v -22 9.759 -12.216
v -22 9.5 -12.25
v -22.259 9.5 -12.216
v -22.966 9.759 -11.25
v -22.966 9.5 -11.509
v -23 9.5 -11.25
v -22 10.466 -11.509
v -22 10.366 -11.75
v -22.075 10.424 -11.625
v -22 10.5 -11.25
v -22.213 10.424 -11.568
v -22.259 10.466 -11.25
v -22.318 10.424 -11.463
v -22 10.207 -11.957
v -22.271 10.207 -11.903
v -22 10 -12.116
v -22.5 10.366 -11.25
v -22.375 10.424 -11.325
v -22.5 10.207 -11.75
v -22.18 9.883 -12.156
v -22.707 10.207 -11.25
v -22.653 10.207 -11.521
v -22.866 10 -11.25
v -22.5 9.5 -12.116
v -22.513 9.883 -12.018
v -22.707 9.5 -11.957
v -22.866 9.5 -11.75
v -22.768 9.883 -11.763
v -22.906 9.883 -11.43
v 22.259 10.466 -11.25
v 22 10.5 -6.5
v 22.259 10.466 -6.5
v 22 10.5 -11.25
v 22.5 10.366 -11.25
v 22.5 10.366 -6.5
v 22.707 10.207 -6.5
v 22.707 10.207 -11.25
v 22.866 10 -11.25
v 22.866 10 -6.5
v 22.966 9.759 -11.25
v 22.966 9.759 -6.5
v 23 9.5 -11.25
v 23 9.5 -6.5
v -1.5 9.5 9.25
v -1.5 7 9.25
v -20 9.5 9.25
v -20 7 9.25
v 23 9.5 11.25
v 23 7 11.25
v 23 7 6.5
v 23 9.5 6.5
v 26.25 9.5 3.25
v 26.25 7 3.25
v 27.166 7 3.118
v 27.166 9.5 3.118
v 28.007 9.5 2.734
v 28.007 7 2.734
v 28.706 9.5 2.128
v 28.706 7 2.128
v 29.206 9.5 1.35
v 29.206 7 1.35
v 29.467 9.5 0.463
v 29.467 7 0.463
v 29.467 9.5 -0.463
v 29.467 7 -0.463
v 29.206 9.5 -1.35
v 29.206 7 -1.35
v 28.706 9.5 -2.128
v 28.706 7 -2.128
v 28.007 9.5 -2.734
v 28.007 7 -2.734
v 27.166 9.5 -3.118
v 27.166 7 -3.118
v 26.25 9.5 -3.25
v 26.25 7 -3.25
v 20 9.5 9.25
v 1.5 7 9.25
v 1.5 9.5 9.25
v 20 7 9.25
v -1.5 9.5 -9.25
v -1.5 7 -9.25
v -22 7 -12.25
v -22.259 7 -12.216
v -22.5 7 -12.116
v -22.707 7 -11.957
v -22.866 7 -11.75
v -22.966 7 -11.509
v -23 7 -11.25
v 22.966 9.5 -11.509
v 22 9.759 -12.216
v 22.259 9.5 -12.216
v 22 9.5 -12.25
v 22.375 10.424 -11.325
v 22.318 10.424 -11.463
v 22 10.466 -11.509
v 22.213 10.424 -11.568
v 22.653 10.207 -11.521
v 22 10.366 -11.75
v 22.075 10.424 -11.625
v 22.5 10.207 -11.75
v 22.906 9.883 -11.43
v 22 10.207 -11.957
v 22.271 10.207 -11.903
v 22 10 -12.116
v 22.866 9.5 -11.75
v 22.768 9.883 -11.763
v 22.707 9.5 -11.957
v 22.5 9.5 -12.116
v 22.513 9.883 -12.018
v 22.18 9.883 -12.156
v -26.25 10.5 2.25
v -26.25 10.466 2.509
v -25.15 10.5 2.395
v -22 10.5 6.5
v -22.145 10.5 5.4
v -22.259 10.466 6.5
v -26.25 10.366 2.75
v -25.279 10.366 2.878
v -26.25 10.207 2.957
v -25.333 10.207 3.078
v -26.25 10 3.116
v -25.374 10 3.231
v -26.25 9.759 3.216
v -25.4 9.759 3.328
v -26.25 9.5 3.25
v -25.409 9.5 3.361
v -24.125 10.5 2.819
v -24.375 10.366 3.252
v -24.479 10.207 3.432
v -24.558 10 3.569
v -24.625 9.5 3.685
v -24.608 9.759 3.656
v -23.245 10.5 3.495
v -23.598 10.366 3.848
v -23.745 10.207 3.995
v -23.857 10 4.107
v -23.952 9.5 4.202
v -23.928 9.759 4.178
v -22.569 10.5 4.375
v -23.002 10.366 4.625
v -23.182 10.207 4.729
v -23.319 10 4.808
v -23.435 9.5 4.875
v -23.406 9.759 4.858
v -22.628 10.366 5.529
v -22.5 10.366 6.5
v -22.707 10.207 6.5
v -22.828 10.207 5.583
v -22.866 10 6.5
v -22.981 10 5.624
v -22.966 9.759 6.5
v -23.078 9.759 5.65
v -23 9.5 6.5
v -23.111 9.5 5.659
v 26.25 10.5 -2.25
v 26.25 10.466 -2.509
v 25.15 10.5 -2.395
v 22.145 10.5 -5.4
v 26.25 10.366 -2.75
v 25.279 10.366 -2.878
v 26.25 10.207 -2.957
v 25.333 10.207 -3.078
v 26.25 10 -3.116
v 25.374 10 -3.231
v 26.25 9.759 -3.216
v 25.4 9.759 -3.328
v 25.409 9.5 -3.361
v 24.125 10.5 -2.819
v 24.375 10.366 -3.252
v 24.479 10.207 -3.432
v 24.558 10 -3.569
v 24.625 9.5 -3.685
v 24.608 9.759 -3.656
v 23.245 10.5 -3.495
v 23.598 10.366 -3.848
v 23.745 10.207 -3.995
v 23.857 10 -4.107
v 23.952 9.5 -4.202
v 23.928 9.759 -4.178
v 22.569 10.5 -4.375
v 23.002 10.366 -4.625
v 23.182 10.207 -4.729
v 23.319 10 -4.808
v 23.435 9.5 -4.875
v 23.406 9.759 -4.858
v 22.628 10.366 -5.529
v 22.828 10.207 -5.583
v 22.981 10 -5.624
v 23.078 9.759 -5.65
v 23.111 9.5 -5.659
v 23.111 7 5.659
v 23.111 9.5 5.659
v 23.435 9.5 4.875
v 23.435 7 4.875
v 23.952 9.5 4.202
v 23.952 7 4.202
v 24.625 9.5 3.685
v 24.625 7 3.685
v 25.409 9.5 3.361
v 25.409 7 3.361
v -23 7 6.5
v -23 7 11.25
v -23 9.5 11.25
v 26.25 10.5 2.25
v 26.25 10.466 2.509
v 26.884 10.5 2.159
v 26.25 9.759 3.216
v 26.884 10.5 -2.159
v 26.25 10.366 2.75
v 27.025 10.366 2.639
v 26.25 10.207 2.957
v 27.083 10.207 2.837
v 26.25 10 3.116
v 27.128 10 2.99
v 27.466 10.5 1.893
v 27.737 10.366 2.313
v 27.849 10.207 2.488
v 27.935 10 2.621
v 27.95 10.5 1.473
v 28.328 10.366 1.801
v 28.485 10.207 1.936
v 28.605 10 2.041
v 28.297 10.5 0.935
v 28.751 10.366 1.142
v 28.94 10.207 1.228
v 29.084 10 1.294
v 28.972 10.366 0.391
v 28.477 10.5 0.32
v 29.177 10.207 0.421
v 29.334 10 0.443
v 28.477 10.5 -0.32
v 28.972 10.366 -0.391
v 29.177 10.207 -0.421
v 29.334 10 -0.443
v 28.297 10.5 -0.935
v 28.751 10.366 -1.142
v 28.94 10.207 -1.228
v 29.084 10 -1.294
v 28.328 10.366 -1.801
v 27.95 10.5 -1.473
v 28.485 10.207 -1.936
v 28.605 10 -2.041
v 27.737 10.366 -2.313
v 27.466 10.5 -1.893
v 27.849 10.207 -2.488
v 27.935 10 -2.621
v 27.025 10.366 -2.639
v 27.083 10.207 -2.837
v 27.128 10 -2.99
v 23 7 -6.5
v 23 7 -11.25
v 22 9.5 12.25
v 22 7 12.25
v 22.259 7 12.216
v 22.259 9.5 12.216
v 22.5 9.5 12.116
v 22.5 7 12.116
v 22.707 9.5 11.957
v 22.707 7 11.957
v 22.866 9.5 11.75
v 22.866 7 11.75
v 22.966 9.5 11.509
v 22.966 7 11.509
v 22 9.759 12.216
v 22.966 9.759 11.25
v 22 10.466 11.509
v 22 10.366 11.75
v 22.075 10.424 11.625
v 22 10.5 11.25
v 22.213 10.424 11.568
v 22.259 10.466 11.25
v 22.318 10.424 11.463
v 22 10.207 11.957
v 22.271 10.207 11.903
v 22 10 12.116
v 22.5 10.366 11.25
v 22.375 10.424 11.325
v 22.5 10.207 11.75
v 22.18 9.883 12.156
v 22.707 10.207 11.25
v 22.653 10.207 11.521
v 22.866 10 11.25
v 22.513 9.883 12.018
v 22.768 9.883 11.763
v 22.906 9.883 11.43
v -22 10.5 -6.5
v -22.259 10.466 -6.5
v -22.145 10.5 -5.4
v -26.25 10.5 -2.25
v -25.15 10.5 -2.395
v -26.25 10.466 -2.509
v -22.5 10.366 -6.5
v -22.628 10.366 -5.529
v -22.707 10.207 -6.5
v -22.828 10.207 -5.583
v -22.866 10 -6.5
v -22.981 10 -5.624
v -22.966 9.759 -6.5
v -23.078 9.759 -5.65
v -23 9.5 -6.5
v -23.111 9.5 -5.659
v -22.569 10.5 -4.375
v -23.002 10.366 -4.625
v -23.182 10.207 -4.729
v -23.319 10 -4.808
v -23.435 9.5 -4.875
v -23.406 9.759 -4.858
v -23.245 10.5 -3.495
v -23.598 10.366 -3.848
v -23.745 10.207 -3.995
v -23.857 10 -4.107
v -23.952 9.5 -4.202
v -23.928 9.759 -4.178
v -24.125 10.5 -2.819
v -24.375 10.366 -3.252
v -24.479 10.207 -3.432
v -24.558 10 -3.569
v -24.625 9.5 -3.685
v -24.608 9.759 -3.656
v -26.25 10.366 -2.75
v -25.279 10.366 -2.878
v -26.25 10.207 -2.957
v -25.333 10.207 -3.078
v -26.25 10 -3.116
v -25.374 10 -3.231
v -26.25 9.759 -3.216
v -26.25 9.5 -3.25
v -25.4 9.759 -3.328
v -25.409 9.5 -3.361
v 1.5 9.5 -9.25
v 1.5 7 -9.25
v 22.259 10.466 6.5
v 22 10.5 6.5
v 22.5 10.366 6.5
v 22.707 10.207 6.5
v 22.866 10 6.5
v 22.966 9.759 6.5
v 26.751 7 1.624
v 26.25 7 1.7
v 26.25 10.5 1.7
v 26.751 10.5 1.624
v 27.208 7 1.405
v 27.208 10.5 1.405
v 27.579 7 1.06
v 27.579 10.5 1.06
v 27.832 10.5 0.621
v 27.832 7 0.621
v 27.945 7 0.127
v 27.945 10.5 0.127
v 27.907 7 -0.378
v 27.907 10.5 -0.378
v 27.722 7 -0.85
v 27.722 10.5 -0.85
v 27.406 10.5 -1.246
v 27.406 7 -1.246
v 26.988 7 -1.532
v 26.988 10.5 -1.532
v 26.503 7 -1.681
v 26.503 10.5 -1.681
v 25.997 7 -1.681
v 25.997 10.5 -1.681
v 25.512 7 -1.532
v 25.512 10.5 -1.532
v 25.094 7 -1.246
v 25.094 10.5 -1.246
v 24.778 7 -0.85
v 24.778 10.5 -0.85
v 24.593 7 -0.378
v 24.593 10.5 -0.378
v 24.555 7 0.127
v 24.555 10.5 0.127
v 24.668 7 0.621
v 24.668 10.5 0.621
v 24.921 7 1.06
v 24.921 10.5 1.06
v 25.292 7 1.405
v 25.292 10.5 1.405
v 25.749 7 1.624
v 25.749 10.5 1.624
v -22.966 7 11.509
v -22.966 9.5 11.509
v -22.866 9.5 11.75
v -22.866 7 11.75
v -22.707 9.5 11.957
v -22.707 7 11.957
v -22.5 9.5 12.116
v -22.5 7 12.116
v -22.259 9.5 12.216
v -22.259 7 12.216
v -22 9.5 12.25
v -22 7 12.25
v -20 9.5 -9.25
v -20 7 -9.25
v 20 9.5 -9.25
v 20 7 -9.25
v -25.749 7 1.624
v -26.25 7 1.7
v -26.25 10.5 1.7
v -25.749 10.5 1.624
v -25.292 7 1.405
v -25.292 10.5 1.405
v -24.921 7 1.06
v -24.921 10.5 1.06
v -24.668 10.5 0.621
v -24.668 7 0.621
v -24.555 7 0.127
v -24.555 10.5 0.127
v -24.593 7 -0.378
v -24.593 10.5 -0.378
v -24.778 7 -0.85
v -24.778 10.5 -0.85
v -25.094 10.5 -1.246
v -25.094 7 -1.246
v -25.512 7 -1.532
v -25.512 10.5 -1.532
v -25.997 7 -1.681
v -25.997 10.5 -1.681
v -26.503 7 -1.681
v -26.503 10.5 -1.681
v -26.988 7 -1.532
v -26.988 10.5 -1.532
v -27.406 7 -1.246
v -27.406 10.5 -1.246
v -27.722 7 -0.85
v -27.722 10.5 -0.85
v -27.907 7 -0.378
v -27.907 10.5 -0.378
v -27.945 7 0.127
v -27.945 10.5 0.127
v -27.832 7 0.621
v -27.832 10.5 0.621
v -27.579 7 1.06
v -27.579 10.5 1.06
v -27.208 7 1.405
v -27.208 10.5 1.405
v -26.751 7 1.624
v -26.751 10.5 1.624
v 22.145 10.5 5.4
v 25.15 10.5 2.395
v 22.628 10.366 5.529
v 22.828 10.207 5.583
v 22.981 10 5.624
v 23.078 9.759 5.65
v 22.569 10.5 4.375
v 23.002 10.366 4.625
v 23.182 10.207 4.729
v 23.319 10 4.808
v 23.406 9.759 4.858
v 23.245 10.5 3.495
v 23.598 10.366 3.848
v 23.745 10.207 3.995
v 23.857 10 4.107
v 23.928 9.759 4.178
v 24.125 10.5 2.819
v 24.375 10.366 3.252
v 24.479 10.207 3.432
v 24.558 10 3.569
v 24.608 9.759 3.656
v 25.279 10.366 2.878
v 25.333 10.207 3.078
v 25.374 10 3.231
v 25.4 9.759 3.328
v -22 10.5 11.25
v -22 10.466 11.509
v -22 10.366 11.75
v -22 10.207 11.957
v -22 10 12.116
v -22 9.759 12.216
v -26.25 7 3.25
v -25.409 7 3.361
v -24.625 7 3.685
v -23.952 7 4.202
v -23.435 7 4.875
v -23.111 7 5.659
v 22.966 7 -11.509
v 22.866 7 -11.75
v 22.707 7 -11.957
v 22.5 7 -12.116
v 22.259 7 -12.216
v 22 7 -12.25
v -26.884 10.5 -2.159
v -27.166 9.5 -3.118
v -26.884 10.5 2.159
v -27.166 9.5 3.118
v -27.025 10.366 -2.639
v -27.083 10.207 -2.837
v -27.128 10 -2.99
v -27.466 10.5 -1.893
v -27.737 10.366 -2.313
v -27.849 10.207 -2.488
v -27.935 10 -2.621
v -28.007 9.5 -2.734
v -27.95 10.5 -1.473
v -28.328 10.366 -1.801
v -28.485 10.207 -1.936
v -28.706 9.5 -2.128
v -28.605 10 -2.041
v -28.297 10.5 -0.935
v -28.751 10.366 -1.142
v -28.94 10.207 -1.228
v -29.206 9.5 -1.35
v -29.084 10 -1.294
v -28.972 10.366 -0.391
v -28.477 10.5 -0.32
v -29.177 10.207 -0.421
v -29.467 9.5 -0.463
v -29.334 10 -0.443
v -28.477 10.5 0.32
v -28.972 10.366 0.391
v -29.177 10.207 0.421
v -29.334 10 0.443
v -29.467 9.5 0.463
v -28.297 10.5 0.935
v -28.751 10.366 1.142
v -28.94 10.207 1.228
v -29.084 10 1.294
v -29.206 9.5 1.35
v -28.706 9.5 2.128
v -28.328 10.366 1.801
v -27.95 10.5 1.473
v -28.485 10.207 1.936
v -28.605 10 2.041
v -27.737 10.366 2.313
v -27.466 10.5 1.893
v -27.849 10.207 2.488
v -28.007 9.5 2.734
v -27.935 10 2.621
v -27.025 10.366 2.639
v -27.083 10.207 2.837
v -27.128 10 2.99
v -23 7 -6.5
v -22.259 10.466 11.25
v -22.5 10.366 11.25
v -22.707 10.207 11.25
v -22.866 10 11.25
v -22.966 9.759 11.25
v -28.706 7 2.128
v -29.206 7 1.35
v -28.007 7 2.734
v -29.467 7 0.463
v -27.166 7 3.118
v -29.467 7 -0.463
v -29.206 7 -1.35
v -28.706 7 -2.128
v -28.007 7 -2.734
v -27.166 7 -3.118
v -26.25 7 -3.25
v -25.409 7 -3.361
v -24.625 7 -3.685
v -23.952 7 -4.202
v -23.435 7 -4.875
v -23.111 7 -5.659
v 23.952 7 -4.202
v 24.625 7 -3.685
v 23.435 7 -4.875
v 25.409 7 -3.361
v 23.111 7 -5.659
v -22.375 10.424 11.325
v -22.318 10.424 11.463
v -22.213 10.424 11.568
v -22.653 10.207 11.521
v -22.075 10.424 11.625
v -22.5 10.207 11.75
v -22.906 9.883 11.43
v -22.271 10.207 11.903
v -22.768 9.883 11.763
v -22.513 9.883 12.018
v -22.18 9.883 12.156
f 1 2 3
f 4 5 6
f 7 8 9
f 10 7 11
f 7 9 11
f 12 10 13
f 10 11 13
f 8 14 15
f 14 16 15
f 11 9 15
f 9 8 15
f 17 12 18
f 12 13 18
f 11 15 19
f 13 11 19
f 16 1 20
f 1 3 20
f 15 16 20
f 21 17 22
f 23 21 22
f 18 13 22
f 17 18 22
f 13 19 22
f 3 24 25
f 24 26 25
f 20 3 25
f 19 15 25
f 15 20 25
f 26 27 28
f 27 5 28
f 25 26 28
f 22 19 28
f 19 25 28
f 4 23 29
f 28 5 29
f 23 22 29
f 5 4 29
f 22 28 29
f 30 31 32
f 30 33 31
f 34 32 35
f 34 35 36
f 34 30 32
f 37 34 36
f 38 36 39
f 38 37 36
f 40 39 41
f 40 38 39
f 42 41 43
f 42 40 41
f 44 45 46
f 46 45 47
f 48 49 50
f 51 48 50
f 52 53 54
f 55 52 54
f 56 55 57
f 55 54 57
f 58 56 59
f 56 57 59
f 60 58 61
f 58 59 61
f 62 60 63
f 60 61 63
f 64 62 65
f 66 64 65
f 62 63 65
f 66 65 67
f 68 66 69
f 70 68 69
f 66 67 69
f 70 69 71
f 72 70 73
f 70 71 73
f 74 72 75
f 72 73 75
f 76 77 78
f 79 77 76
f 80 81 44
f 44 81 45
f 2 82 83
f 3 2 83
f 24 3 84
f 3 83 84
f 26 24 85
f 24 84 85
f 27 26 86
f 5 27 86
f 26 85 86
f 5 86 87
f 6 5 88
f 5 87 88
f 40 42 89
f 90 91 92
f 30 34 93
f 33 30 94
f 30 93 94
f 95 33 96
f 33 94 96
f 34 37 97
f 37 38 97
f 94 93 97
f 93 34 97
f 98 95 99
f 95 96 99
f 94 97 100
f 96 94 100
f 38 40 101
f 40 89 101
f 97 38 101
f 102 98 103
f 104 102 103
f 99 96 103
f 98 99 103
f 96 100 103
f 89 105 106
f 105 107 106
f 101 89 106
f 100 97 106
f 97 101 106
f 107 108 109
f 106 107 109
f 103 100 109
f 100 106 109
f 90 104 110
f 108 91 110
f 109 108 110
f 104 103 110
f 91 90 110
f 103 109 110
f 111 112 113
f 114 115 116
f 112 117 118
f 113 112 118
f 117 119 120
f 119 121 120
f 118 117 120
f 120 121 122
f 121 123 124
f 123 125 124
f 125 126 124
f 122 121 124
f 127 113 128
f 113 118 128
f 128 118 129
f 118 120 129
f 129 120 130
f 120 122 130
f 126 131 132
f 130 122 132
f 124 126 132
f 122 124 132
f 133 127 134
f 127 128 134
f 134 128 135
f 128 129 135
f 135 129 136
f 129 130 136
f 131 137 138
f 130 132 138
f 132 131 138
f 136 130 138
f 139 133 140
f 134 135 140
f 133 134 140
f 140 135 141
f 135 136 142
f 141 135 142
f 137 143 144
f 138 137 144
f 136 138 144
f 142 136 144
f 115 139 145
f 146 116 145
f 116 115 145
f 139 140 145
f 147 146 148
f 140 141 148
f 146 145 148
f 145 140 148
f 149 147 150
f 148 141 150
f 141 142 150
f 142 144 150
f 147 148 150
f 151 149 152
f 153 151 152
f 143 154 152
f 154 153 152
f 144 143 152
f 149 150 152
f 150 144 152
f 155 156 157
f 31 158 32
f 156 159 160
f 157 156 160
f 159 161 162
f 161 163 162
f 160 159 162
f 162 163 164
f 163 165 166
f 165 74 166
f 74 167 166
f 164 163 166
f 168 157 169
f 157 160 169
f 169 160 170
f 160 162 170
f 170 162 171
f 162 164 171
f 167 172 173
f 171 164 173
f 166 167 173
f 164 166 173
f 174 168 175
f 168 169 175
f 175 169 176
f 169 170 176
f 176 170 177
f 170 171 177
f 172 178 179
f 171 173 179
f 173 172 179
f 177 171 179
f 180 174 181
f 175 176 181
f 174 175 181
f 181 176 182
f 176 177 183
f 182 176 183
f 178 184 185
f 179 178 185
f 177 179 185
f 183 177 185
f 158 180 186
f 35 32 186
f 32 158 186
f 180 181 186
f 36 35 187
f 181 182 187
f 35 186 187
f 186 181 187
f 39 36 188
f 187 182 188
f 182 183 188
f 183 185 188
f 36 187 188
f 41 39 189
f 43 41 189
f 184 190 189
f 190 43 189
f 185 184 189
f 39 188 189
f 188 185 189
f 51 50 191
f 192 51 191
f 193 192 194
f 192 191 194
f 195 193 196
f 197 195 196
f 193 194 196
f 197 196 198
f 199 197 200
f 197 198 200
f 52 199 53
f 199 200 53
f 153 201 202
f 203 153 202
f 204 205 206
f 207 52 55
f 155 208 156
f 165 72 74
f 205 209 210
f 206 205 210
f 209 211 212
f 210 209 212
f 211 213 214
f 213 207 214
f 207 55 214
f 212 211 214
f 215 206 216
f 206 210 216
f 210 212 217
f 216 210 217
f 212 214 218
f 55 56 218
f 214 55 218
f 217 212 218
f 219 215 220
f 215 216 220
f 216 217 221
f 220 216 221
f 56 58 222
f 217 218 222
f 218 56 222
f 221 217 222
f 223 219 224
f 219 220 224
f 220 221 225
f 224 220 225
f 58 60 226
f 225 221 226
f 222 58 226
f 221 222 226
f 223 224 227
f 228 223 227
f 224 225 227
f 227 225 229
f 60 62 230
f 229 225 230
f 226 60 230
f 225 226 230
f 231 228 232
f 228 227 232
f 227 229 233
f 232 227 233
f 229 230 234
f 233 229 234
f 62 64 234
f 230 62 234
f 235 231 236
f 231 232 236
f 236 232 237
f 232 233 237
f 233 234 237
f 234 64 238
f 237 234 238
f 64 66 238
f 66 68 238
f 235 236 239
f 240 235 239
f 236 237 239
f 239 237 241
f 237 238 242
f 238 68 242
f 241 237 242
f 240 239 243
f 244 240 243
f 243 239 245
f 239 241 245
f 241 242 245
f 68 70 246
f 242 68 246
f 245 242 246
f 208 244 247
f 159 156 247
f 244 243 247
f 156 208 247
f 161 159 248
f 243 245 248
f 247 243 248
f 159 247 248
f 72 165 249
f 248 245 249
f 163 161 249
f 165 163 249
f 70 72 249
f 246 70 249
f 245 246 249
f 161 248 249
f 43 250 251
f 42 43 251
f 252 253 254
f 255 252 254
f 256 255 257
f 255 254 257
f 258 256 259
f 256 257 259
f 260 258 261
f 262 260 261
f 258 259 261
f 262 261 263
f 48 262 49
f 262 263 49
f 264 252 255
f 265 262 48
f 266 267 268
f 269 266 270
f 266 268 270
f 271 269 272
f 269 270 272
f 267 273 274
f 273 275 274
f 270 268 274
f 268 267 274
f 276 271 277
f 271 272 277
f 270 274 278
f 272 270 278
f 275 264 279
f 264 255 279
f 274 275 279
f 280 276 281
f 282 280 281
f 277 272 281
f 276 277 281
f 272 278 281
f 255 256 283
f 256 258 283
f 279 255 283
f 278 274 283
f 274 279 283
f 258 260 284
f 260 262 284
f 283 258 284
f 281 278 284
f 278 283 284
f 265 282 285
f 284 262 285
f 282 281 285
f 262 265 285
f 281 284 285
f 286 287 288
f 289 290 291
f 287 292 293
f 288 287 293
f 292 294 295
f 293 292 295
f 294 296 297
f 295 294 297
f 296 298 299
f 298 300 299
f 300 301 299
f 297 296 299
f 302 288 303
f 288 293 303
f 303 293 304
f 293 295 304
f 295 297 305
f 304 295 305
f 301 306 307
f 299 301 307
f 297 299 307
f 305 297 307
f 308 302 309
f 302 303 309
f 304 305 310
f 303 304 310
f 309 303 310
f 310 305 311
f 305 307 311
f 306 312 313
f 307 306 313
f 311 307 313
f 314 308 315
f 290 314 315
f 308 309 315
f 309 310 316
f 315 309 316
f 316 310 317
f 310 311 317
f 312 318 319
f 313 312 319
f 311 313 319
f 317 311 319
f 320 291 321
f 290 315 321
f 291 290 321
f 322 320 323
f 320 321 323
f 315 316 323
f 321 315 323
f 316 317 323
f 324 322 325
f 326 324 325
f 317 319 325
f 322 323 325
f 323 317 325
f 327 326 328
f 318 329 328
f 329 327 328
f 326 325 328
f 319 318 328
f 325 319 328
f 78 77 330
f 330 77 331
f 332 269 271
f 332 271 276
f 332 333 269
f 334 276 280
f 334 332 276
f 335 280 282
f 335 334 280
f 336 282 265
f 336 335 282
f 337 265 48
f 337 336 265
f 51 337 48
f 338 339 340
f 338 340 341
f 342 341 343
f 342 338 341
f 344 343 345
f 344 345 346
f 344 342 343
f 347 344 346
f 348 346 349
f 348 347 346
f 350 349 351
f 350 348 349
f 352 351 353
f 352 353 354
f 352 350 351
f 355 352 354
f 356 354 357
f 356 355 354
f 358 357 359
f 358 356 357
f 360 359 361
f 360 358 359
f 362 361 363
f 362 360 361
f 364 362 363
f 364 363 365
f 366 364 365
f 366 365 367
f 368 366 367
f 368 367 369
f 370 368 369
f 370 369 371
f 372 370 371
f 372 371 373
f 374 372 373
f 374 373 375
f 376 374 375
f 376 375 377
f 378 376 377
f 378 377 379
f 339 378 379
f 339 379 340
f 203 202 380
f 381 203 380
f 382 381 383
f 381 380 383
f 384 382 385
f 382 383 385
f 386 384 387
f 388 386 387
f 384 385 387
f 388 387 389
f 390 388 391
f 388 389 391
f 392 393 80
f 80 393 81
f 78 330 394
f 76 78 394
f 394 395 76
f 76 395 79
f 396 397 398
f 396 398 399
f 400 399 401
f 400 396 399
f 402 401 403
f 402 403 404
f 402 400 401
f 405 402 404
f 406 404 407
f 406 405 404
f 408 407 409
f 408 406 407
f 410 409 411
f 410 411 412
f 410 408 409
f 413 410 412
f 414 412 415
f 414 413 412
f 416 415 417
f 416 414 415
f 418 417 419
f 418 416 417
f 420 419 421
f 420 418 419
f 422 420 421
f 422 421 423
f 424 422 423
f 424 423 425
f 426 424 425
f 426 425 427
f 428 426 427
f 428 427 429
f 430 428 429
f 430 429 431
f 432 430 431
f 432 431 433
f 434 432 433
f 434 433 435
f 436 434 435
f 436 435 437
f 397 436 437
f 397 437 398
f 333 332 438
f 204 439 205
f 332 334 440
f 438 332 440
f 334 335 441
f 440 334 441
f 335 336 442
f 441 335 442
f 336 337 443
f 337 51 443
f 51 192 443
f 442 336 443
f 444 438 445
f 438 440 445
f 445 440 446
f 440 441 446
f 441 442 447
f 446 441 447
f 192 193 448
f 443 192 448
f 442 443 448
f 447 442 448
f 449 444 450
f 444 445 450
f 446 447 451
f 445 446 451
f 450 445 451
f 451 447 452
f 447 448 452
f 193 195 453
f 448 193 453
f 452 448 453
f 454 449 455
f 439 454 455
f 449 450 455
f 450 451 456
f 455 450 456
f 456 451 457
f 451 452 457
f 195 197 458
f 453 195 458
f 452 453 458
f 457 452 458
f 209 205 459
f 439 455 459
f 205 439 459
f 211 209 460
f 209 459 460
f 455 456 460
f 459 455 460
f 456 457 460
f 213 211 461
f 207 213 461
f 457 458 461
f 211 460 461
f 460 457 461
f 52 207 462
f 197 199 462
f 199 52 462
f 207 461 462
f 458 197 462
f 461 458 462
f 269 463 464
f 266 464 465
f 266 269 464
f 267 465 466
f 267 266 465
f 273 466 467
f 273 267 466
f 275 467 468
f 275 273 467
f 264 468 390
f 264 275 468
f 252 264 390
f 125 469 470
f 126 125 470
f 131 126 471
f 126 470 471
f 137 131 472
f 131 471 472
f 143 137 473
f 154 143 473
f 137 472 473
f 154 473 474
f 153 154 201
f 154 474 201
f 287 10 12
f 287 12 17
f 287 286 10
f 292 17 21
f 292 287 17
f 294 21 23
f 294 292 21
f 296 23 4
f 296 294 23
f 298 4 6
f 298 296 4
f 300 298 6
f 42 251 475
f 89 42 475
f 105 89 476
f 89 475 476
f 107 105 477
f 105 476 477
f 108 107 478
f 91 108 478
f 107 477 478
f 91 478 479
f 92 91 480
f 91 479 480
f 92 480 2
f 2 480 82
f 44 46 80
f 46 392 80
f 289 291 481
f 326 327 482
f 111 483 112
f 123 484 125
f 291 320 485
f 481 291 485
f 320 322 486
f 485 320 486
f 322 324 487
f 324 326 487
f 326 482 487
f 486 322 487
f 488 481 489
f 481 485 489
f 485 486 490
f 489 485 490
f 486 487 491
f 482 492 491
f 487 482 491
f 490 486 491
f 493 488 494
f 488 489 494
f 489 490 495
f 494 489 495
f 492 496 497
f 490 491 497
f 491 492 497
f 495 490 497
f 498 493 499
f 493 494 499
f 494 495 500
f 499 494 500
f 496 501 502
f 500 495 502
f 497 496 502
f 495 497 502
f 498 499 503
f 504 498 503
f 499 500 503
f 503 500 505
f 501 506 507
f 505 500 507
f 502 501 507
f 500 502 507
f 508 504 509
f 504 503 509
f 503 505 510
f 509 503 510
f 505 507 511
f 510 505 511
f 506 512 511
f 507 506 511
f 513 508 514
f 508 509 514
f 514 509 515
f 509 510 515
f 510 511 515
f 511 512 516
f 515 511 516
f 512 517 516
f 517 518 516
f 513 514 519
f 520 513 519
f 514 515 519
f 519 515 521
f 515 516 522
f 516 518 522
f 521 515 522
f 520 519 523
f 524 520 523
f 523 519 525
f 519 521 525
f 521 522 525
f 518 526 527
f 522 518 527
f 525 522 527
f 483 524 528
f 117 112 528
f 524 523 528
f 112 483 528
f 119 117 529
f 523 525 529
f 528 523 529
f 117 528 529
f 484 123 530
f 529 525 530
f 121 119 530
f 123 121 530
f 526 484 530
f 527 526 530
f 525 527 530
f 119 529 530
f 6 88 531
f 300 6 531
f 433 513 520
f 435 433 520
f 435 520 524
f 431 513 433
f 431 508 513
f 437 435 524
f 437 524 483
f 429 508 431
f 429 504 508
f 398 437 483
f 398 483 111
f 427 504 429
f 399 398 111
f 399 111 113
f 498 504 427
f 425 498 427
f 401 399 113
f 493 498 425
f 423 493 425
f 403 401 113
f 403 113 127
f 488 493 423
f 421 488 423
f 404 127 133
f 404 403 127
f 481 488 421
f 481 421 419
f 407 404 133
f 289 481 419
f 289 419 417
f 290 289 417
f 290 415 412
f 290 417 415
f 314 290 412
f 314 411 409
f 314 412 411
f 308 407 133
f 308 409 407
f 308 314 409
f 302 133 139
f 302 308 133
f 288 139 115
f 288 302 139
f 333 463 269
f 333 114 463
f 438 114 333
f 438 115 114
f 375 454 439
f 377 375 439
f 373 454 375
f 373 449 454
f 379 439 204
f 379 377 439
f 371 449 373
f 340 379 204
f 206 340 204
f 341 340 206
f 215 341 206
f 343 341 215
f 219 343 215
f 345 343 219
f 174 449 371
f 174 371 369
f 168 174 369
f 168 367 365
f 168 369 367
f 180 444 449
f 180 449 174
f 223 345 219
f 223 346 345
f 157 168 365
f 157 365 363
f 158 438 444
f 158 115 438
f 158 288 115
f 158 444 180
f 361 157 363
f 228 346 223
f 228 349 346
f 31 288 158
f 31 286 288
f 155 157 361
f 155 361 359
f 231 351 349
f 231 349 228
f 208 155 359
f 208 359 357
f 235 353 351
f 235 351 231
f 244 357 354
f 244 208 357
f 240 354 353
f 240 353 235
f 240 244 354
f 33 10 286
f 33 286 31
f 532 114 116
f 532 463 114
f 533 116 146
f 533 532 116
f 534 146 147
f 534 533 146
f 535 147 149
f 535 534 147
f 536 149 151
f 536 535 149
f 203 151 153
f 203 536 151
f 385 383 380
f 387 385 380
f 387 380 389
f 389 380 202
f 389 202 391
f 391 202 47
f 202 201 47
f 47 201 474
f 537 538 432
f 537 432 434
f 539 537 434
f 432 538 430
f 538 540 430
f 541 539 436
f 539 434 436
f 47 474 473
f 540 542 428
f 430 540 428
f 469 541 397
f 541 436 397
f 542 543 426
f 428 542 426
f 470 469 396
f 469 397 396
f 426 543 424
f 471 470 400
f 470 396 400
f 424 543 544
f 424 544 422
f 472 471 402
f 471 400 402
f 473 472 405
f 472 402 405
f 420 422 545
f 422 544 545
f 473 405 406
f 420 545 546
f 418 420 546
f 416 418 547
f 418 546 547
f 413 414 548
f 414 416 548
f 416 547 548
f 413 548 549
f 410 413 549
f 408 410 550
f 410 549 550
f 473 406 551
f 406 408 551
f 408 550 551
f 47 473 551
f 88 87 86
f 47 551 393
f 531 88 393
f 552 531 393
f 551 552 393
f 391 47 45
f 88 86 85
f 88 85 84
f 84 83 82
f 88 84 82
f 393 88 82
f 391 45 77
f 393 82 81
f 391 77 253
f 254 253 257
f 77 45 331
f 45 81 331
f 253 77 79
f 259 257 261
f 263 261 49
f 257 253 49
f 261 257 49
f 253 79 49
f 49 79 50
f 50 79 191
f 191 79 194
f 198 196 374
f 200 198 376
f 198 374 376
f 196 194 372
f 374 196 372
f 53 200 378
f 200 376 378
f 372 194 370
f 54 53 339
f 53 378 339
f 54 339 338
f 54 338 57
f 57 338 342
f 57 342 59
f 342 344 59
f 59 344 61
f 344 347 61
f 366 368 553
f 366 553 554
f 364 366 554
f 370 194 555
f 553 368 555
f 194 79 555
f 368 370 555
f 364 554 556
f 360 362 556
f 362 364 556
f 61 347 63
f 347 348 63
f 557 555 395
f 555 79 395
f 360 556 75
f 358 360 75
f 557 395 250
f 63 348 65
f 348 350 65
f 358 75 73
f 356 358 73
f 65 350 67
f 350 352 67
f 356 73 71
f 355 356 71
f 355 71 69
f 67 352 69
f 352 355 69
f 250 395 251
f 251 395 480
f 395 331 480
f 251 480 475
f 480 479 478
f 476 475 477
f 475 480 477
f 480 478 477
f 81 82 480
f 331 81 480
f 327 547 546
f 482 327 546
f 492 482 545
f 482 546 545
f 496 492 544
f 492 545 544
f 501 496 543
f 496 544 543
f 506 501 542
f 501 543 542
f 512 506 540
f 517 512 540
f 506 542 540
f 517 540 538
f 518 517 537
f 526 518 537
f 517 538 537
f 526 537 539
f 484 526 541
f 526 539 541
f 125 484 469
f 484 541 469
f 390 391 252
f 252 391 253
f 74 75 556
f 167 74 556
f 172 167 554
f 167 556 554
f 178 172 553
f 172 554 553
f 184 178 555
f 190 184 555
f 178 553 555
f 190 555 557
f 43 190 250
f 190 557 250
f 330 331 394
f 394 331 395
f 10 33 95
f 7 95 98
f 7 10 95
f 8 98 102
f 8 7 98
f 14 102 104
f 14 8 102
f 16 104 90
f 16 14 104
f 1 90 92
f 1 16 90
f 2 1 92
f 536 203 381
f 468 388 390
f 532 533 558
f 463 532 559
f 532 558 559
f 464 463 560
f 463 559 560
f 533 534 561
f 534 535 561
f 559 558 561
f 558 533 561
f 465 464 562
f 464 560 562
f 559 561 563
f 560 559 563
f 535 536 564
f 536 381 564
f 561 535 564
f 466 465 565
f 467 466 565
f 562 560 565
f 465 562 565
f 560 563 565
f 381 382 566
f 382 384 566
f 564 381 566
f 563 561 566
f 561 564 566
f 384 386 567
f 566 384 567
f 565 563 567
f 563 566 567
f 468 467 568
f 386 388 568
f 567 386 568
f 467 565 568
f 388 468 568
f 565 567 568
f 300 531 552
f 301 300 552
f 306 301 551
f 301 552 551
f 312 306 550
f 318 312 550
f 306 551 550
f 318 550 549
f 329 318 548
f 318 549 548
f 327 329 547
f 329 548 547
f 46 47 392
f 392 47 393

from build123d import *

# Parameters (mm, degrees)
SKETCH_1_R      = 1.7
SKETCH_1_W      = 10
SKETCH_1_H      = 3
SKETCH_1_H_2    = 7
EXTRUDE_1_DEPTH = 1
EXTRUDE_START   = 1
SKETCH_1_3_R    = 1.7
EXTRUDE_2_DEPTH = 1
EXTRUDE_START_2 = 2
SKETCH_1_5_R    = 1.7
EXTRUDE_3_DEPTH = 3
EXTRUDE_START_3 = 7
SKETCH_1_7_R    = 1.7
SKETCH_1_7_W    = 10
SKETCH_1_7_H    = 3
EXTRUDE_4_DEPTH = 2.5
EXTRUDE_START_4 = 9.5
SKETCH_1_9_W    = 10
SKETCH_1_9_H    = 7
SKETCH_1_9_H_2  = 3
SKETCH_1_9_R    = 1.7
EXTRUDE_5_DEPTH = 1
FILLET_1_R      = 1


with BuildPart() as part:
    # Эскиз1 → Бобышка-Вытянуть1 (new body)
    # profile 1 of 9: a face of its own
    with BuildSketch(Plane(origin=(0, 0, 0), x_dir=(1, 0, 0), z_dir=(0, 1, 0))):
        with BuildLine():
            ThreePointArc((-26.25, -3.25), (-23.951902961, -4.201902961), (-23, -6.5))
            Line((-23, -6.5), (-23, 6.5))
            ThreePointArc((-23, 6.5), (-23.951902961, 4.201902961), (-26.25, 3.25))
            ThreePointArc((-26.25, 3.25), (-29.5, 0), (-26.25, -3.25))
        make_face()
        with Locations(Location((-26.25, 0, 0), (0, 0, 270))):
            Circle(SKETCH_1_R, mode=Mode.SUBTRACT)
    # profile 2 of 9: a face of its own
    with BuildSketch(Plane(origin=(0, 0, 0), x_dir=(1, 0, 0), z_dir=(0, 1, 0))):
        with BuildLine():
            Line((20, -12.25), (22, -12.25))
            ThreePointArc((22, -12.25), (22.707106781, -11.957106781), (23, -11.25))
            Line((23, -11.25), (23, -6.5))
            Line((23, -6.5), (23, 6.5))
            Line((23, 6.5), (23, 11.25))
            ThreePointArc((23, 11.25), (22.707106781, 11.957106781), (22, 12.25))
            Line((22, 12.25), (-22, 12.25))
            ThreePointArc((-22, 12.25), (-22.707106781, 11.957106781), (-23, 11.25))
            Line((-23, 11.25), (-23, 6.5))
            Line((-23, 6.5), (-23, -6.5))
            Line((-23, -6.5), (-23, -11.25))
            ThreePointArc((-23, -11.25), (-22.707106781, -11.957106781), (-22, -12.25))
            Line((-22, -12.25), (-11.5, -12.25))
            Line((-11.5, -12.25), (-11.5, -9.25))
            Line((-11.5, -9.25), (-20, -9.25))
            Line((-20, -9.25), (-20, 9.25))
            Line((-20, 9.25), (-1.5, 9.25))
            Line((-1.5, 9.25), (-1.5, -2.25))
            Line((-1.5, -2.25), (-1.5, -9.25))
            Line((-1.5, -9.25), (-1.5, -12.25))
            Line((-1.5, -12.25), (10, -12.25))
            Line((10, -12.25), (10, -9.25))
            Line((10, -9.25), (1.5, -9.25))
            Line((1.5, -9.25), (1.5, 9.25))
            Line((1.5, 9.25), (20, 9.25))
            Line((20, 9.25), (20, -2.25))
            Line((20, -2.25), (20, -9.25))
            Line((20, -9.25), (20, -12.25))
        make_face()
    # profile 3 of 9: a face of its own
    with BuildSketch(Plane(origin=(0, 0, 0), x_dir=(1, 0, 0), z_dir=(0, 1, 0))):
        with Locations((-6.5, -10.75)):
            Rectangle(SKETCH_1_W, SKETCH_1_H)
    # profile 4 of 9: a face of its own
    with BuildSketch(Plane(origin=(0, 0, 0), x_dir=(1, 0, 0), z_dir=(0, 1, 0))):
        with Locations((-6.5, -5.75)):
            Rectangle(SKETCH_1_W, SKETCH_1_H_2)
    # profile 5 of 9: a face of its own
    with BuildSketch(Plane(origin=(0, 0, 0), x_dir=(1, 0, 0), z_dir=(0, 1, 0))):
        Polygon((-20, -9.25), (-11.5, -9.25), (-11.5, -2.25), (-1.5, -2.25), (-1.5, 9.25), (-20, 9.25), align=None)
    # profile 6 of 9: a face of its own
    with BuildSketch(Plane(origin=(0, 0, 0), x_dir=(1, 0, 0), z_dir=(0, 1, 0))):
        Polygon((1.5, -9.25), (10, -9.25), (10, -2.25), (20, -2.25), (20, 9.25), (1.5, 9.25), align=None)
    # profile 7 of 9: a face of its own
    with BuildSketch(Plane(origin=(0, 0, 0), x_dir=(1, 0, 0), z_dir=(0, 1, 0))):
        with Locations((15, -10.75)):
            Rectangle(SKETCH_1_W, SKETCH_1_H)
    # profile 8 of 9: a face of its own
    with BuildSketch(Plane(origin=(0, 0, 0), x_dir=(1, 0, 0), z_dir=(0, 1, 0))):
        with Locations((15, -5.75)):
            Rectangle(SKETCH_1_W, SKETCH_1_H_2)
    # profile 9 of 9: a face of its own
    with BuildSketch(Plane(origin=(0, 0, 0), x_dir=(1, 0, 0), z_dir=(0, 1, 0))):
        with BuildLine():
            Line((23, 6.5), (23, -6.5))
            ThreePointArc((23, -6.5), (23.951902961, -4.201902961), (26.25, -3.25))
            ThreePointArc((26.25, -3.25), (29.5, 0), (26.25, 3.25))
            ThreePointArc((26.25, 3.25), (23.951902961, 4.201902961), (23, 6.5))
        make_face()
        with Locations(Location((26.25, 0, 0), (0, 0, 270))):
            Circle(SKETCH_1_R, mode=Mode.SUBTRACT)
    extrude(amount=EXTRUDE_1_DEPTH)

    # Эскиз1<3> → Бобышка-Вытянуть2 (add)
    # profile 1 of 5: a face of its own
    with BuildSketch(Plane(origin=(0, 0, 0), x_dir=(1, 0, 0), z_dir=(0, 1, 0)).offset(EXTRUDE_START)):
        with BuildLine():
            Line((20, -12.25), (22, -12.25))
            ThreePointArc((22, -12.25), (22.707106781, -11.957106781), (23, -11.25))
            Line((23, -11.25), (23, -6.5))
            Line((23, -6.5), (23, 6.5))
            Line((23, 6.5), (23, 11.25))
            ThreePointArc((23, 11.25), (22.707106781, 11.957106781), (22, 12.25))
            Line((22, 12.25), (-22, 12.25))
            ThreePointArc((-22, 12.25), (-22.707106781, 11.957106781), (-23, 11.25))
            Line((-23, 11.25), (-23, 6.5))
            Line((-23, 6.5), (-23, -6.5))
            Line((-23, -6.5), (-23, -11.25))
            ThreePointArc((-23, -11.25), (-22.707106781, -11.957106781), (-22, -12.25))
            Line((-22, -12.25), (-11.5, -12.25))
            Line((-11.5, -12.25), (-11.5, -9.25))
            Line((-11.5, -9.25), (-20, -9.25))
            Line((-20, -9.25), (-20, 9.25))
            Line((-20, 9.25), (-1.5, 9.25))
            Line((-1.5, 9.25), (-1.5, -2.25))
            Line((-1.5, -2.25), (-1.5, -9.25))
            Line((-1.5, -9.25), (-1.5, -12.25))
            Line((-1.5, -12.25), (10, -12.25))
            Line((10, -12.25), (10, -9.25))
            Line((10, -9.25), (1.5, -9.25))
            Line((1.5, -9.25), (1.5, 9.25))
            Line((1.5, 9.25), (20, 9.25))
            Line((20, 9.25), (20, -2.25))
            Line((20, -2.25), (20, -9.25))
            Line((20, -9.25), (20, -12.25))
        make_face()
    # profile 2 of 5: a face of its own
    with BuildSketch(Plane(origin=(0, 0, 0), x_dir=(1, 0, 0), z_dir=(0, 1, 0)).offset(EXTRUDE_START)):
        Polygon((-20, -9.25), (-11.5, -9.25), (-11.5, -2.25), (-1.5, -2.25), (-1.5, 9.25), (-20, 9.25), align=None)
    # profile 3 of 5: a face of its own
    with BuildSketch(Plane(origin=(0, 0, 0), x_dir=(1, 0, 0), z_dir=(0, 1, 0)).offset(EXTRUDE_START)):
        with BuildLine():
            ThreePointArc((-26.25, -3.25), (-23.951902961, -4.201902961), (-23, -6.5))
            Line((-23, -6.5), (-23, 6.5))
            ThreePointArc((-23, 6.5), (-23.951902961, 4.201902961), (-26.25, 3.25))
            ThreePointArc((-26.25, 3.25), (-29.5, 0), (-26.25, -3.25))
        make_face()
        with Locations(Location((-26.25, 0, 0), (0, 0, 270))):
            Circle(SKETCH_1_3_R, mode=Mode.SUBTRACT)
    # profile 4 of 5: a face of its own
    with BuildSketch(Plane(origin=(0, 0, 0), x_dir=(1, 0, 0), z_dir=(0, 1, 0)).offset(EXTRUDE_START)):
        Polygon((1.5, -9.25), (10, -9.25), (10, -2.25), (20, -2.25), (20, 9.25), (1.5, 9.25), align=None)
    # profile 5 of 5: a face of its own
    with BuildSketch(Plane(origin=(0, 0, 0), x_dir=(1, 0, 0), z_dir=(0, 1, 0)).offset(EXTRUDE_START)):
        with BuildLine():
            Line((23, 6.5), (23, -6.5))
            ThreePointArc((23, -6.5), (23.951902961, -4.201902961), (26.25, -3.25))
            ThreePointArc((26.25, -3.25), (29.5, 0), (26.25, 3.25))
            ThreePointArc((26.25, 3.25), (23.951902961, 4.201902961), (23, 6.5))
        make_face()
        with Locations(Location((26.25, 0, 0), (0, 0, 270))):
            Circle(SKETCH_1_3_R, mode=Mode.SUBTRACT)
    extrude(amount=EXTRUDE_2_DEPTH)

    # Эскиз1<5> → Бобышка-Вытянуть3 (add)
    # profile 1 of 3: a face of its own
    with BuildSketch(Plane(origin=(0, 0, 0), x_dir=(1, 0, 0), z_dir=(0, 1, 0)).offset(EXTRUDE_START_2)):
        with BuildLine():
            Line((20, -12.25), (22, -12.25))
            ThreePointArc((22, -12.25), (22.707106781, -11.957106781), (23, -11.25))
            Line((23, -11.25), (23, -6.5))
            Line((23, -6.5), (23, 6.5))
            Line((23, 6.5), (23, 11.25))
            ThreePointArc((23, 11.25), (22.707106781, 11.957106781), (22, 12.25))
            Line((22, 12.25), (-22, 12.25))
            ThreePointArc((-22, 12.25), (-22.707106781, 11.957106781), (-23, 11.25))
            Line((-23, 11.25), (-23, 6.5))
            Line((-23, 6.5), (-23, -6.5))
            Line((-23, -6.5), (-23, -11.25))
            ThreePointArc((-23, -11.25), (-22.707106781, -11.957106781), (-22, -12.25))
            Line((-22, -12.25), (-11.5, -12.25))
            Line((-11.5, -12.25), (-11.5, -9.25))
            Line((-11.5, -9.25), (-20, -9.25))
            Line((-20, -9.25), (-20, 9.25))
            Line((-20, 9.25), (-1.5, 9.25))
            Line((-1.5, 9.25), (-1.5, -2.25))
            Line((-1.5, -2.25), (-1.5, -9.25))
            Line((-1.5, -9.25), (-1.5, -12.25))
            Line((-1.5, -12.25), (10, -12.25))
            Line((10, -12.25), (10, -9.25))
            Line((10, -9.25), (1.5, -9.25))
            Line((1.5, -9.25), (1.5, 9.25))
            Line((1.5, 9.25), (20, 9.25))
            Line((20, 9.25), (20, -2.25))
            Line((20, -2.25), (20, -9.25))
            Line((20, -9.25), (20, -12.25))
        make_face()
    # profile 2 of 3: a face of its own
    with BuildSketch(Plane(origin=(0, 0, 0), x_dir=(1, 0, 0), z_dir=(0, 1, 0)).offset(EXTRUDE_START_2)):
        with BuildLine():
            ThreePointArc((-26.25, -3.25), (-23.951902961, -4.201902961), (-23, -6.5))
            Line((-23, -6.5), (-23, 6.5))
            ThreePointArc((-23, 6.5), (-23.951902961, 4.201902961), (-26.25, 3.25))
            ThreePointArc((-26.25, 3.25), (-29.5, 0), (-26.25, -3.25))
        make_face()
        with Locations(Location((-26.25, 0, 0), (0, 0, 270))):
            Circle(SKETCH_1_5_R, mode=Mode.SUBTRACT)
    # profile 3 of 3: a face of its own
    with BuildSketch(Plane(origin=(0, 0, 0), x_dir=(1, 0, 0), z_dir=(0, 1, 0)).offset(EXTRUDE_START_2)):
        with BuildLine():
            Line((23, 6.5), (23, -6.5))
            ThreePointArc((23, -6.5), (23.951902961, -4.201902961), (26.25, -3.25))
            ThreePointArc((26.25, -3.25), (29.5, 0), (26.25, 3.25))
            ThreePointArc((26.25, 3.25), (23.951902961, 4.201902961), (23, 6.5))
        make_face()
        with Locations(Location((26.25, 0, 0), (0, 0, 270))):
            Circle(SKETCH_1_5_R, mode=Mode.SUBTRACT)
    extrude(amount=EXTRUDE_3_DEPTH)


with BuildPart() as body_2:
    # Эскиз1<7> → Бобышка-Вытянуть4 (new body)
    # profile 1 of 5: a face of its own
    with BuildSketch(Plane(origin=(0, 0, 0), x_dir=(1, 0, 0), z_dir=(0, 1, 0)).offset(EXTRUDE_START_3)):
        with BuildLine():
            Line((20, -12.25), (22, -12.25))
            ThreePointArc((22, -12.25), (22.707106781, -11.957106781), (23, -11.25))
            Line((23, -11.25), (23, -6.5))
            Line((23, -6.5), (23, 6.5))
            Line((23, 6.5), (23, 11.25))
            ThreePointArc((23, 11.25), (22.707106781, 11.957106781), (22, 12.25))
            Line((22, 12.25), (-22, 12.25))
            ThreePointArc((-22, 12.25), (-22.707106781, 11.957106781), (-23, 11.25))
            Line((-23, 11.25), (-23, 6.5))
            Line((-23, 6.5), (-23, -6.5))
            Line((-23, -6.5), (-23, -11.25))
            ThreePointArc((-23, -11.25), (-22.707106781, -11.957106781), (-22, -12.25))
            Line((-22, -12.25), (-11.5, -12.25))
            Line((-11.5, -12.25), (-11.5, -9.25))
            Line((-11.5, -9.25), (-20, -9.25))
            Line((-20, -9.25), (-20, 9.25))
            Line((-20, 9.25), (-1.5, 9.25))
            Line((-1.5, 9.25), (-1.5, -2.25))
            Line((-1.5, -2.25), (-1.5, -9.25))
            Line((-1.5, -9.25), (-1.5, -12.25))
            Line((-1.5, -12.25), (10, -12.25))
            Line((10, -12.25), (10, -9.25))
            Line((10, -9.25), (1.5, -9.25))
            Line((1.5, -9.25), (1.5, 9.25))
            Line((1.5, 9.25), (20, 9.25))
            Line((20, 9.25), (20, -2.25))
            Line((20, -2.25), (20, -9.25))
            Line((20, -9.25), (20, -12.25))
        make_face()
    # profile 2 of 5: a face of its own
    with BuildSketch(Plane(origin=(0, 0, 0), x_dir=(1, 0, 0), z_dir=(0, 1, 0)).offset(EXTRUDE_START_3)):
        with BuildLine():
            ThreePointArc((-26.25, -3.25), (-23.951902961, -4.201902961), (-23, -6.5))
            Line((-23, -6.5), (-23, 6.5))
            ThreePointArc((-23, 6.5), (-23.951902961, 4.201902961), (-26.25, 3.25))
            ThreePointArc((-26.25, 3.25), (-29.5, 0), (-26.25, -3.25))
        make_face()
        with Locations(Location((-26.25, 0, 0), (0, 0, 270))):
            Circle(SKETCH_1_7_R, mode=Mode.SUBTRACT)
    # profile 3 of 5: a face of its own
    with BuildSketch(Plane(origin=(0, 0, 0), x_dir=(1, 0, 0), z_dir=(0, 1, 0)).offset(EXTRUDE_START_3)):
        with BuildLine():
            Line((23, 6.5), (23, -6.5))
            ThreePointArc((23, -6.5), (23.951902961, -4.201902961), (26.25, -3.25))
            ThreePointArc((26.25, -3.25), (29.5, 0), (26.25, 3.25))
            ThreePointArc((26.25, 3.25), (23.951902961, 4.201902961), (23, 6.5))
        make_face()
        with Locations(Location((26.25, 0, 0), (0, 0, 270))):
            Circle(SKETCH_1_7_R, mode=Mode.SUBTRACT)
    # profile 4 of 5: a face of its own
    with BuildSketch(Plane(origin=(0, 0, 0), x_dir=(1, 0, 0), z_dir=(0, 1, 0)).offset(EXTRUDE_START_3)):
        with Locations((-6.5, -10.75)):
            Rectangle(SKETCH_1_7_W, SKETCH_1_7_H)
    # profile 5 of 5: a face of its own
    with BuildSketch(Plane(origin=(0, 0, 0), x_dir=(1, 0, 0), z_dir=(0, 1, 0)).offset(EXTRUDE_START_3)):
        with Locations((15, -10.75)):
            Rectangle(SKETCH_1_7_W, SKETCH_1_7_H)
    extrude(amount=EXTRUDE_4_DEPTH)

    # Эскиз1<9> → Бобышка-Вытянуть5 (add)
    # profile 1 of 9: a face of its own
    with BuildSketch(Plane(origin=(0, 0, 0), x_dir=(1, 0, 0), z_dir=(0, 1, 0)).offset(EXTRUDE_START_4)):
        Polygon((-20, -9.25), (-11.5, -9.25), (-11.5, -2.25), (-1.5, -2.25), (-1.5, 9.25), (-20, 9.25), align=None)
    # profile 2 of 9: a face of its own
    with BuildSketch(Plane(origin=(0, 0, 0), x_dir=(1, 0, 0), z_dir=(0, 1, 0)).offset(EXTRUDE_START_4)):
        Polygon((1.5, -9.25), (10, -9.25), (10, -2.25), (20, -2.25), (20, 9.25), (1.5, 9.25), align=None)
    # profile 3 of 9: a face of its own
    with BuildSketch(Plane(origin=(0, 0, 0), x_dir=(1, 0, 0), z_dir=(0, 1, 0)).offset(EXTRUDE_START_4)):
        with Locations((15, -5.75)):
            Rectangle(SKETCH_1_9_W, SKETCH_1_9_H)
    # profile 4 of 9: a face of its own
    with BuildSketch(Plane(origin=(0, 0, 0), x_dir=(1, 0, 0), z_dir=(0, 1, 0)).offset(EXTRUDE_START_4)):
        with Locations((15, -10.75)):
            Rectangle(SKETCH_1_9_W, SKETCH_1_9_H_2)
    # profile 5 of 9: a face of its own
    with BuildSketch(Plane(origin=(0, 0, 0), x_dir=(1, 0, 0), z_dir=(0, 1, 0)).offset(EXTRUDE_START_4)):
        with Locations((-6.5, -10.75)):
            Rectangle(SKETCH_1_9_W, SKETCH_1_9_H_2)
    # profile 6 of 9: a face of its own
    with BuildSketch(Plane(origin=(0, 0, 0), x_dir=(1, 0, 0), z_dir=(0, 1, 0)).offset(EXTRUDE_START_4)):
        with Locations((-6.5, -5.75)):
            Rectangle(SKETCH_1_9_W, SKETCH_1_9_H)
    # profile 7 of 9: a face of its own
    with BuildSketch(Plane(origin=(0, 0, 0), x_dir=(1, 0, 0), z_dir=(0, 1, 0)).offset(EXTRUDE_START_4)):
        with BuildLine():
            Line((20, -12.25), (22, -12.25))
            ThreePointArc((22, -12.25), (22.707106781, -11.957106781), (23, -11.25))
            Line((23, -11.25), (23, -6.5))
            Line((23, -6.5), (23, 6.5))
            Line((23, 6.5), (23, 11.25))
            ThreePointArc((23, 11.25), (22.707106781, 11.957106781), (22, 12.25))
            Line((22, 12.25), (-22, 12.25))
            ThreePointArc((-22, 12.25), (-22.707106781, 11.957106781), (-23, 11.25))
            Line((-23, 11.25), (-23, 6.5))
            Line((-23, 6.5), (-23, -6.5))
            Line((-23, -6.5), (-23, -11.25))
            ThreePointArc((-23, -11.25), (-22.707106781, -11.957106781), (-22, -12.25))
            Line((-22, -12.25), (-11.5, -12.25))
            Line((-11.5, -12.25), (-11.5, -9.25))
            Line((-11.5, -9.25), (-20, -9.25))
            Line((-20, -9.25), (-20, 9.25))
            Line((-20, 9.25), (-1.5, 9.25))
            Line((-1.5, 9.25), (-1.5, -2.25))
            Line((-1.5, -2.25), (-1.5, -9.25))
            Line((-1.5, -9.25), (-1.5, -12.25))
            Line((-1.5, -12.25), (10, -12.25))
            Line((10, -12.25), (10, -9.25))
            Line((10, -9.25), (1.5, -9.25))
            Line((1.5, -9.25), (1.5, 9.25))
            Line((1.5, 9.25), (20, 9.25))
            Line((20, 9.25), (20, -2.25))
            Line((20, -2.25), (20, -9.25))
            Line((20, -9.25), (20, -12.25))
        make_face()
    # profile 8 of 9: a face of its own
    with BuildSketch(Plane(origin=(0, 0, 0), x_dir=(1, 0, 0), z_dir=(0, 1, 0)).offset(EXTRUDE_START_4)):
        with BuildLine():
            Line((23, 6.5), (23, -6.5))
            ThreePointArc((23, -6.5), (23.951902961, -4.201902961), (26.25, -3.25))
            ThreePointArc((26.25, -3.25), (29.5, 0), (26.25, 3.25))
            ThreePointArc((26.25, 3.25), (23.951902961, 4.201902961), (23, 6.5))
        make_face()
        with Locations(Location((26.25, 0, 0), (0, 0, 270))):
            Circle(SKETCH_1_9_R, mode=Mode.SUBTRACT)
    # profile 9 of 9: a face of its own
    with BuildSketch(Plane(origin=(0, 0, 0), x_dir=(1, 0, 0), z_dir=(0, 1, 0)).offset(EXTRUDE_START_4)):
        with BuildLine():
            ThreePointArc((-26.25, -3.25), (-23.951902961, -4.201902961), (-23, -6.5))
            Line((-23, -6.5), (-23, 6.5))
            ThreePointArc((-23, 6.5), (-23.951902961, 4.201902961), (-26.25, 3.25))
            ThreePointArc((-26.25, 3.25), (-29.5, 0), (-26.25, -3.25))
        make_face()
        with Locations(Location((-26.25, 0, 0), (0, 0, 270))):
            Circle(SKETCH_1_9_R, mode=Mode.SUBTRACT)
    extrude(amount=EXTRUDE_5_DEPTH)

    # Скругление1
    fillet_1_edges = [body_2.edges().sort_by_distance(p)[0] for p in [
        (-22.707106781, 10.5, 11.957106781),
        (-23, 10.5, 8.875),
        (-23.951902961, 10.5, 4.201902961),
        (-29.5, 10.5, 0),
        (-23.951902961, 10.5, -4.201902961),
        (-22.707106781, 10.5, -11.957106781),
        (0, 10.5, -12.25),
        (22.707106781, 10.5, -11.957106781),
        (23, 10.5, -8.875),
        (23.951902961, 10.5, -4.201902961),
        (29.5, 10.5, 0),
        (23.951902961, 10.5, 4.201902961),
        (23, 10.5, 8.875),
        (22.707106781, 10.5, 11.957106781),
        (0, 10.5, 12.25),
    ]]
    fillet(fillet_1_edges, radius=FILLET_1_R)


solid = body_2.part
